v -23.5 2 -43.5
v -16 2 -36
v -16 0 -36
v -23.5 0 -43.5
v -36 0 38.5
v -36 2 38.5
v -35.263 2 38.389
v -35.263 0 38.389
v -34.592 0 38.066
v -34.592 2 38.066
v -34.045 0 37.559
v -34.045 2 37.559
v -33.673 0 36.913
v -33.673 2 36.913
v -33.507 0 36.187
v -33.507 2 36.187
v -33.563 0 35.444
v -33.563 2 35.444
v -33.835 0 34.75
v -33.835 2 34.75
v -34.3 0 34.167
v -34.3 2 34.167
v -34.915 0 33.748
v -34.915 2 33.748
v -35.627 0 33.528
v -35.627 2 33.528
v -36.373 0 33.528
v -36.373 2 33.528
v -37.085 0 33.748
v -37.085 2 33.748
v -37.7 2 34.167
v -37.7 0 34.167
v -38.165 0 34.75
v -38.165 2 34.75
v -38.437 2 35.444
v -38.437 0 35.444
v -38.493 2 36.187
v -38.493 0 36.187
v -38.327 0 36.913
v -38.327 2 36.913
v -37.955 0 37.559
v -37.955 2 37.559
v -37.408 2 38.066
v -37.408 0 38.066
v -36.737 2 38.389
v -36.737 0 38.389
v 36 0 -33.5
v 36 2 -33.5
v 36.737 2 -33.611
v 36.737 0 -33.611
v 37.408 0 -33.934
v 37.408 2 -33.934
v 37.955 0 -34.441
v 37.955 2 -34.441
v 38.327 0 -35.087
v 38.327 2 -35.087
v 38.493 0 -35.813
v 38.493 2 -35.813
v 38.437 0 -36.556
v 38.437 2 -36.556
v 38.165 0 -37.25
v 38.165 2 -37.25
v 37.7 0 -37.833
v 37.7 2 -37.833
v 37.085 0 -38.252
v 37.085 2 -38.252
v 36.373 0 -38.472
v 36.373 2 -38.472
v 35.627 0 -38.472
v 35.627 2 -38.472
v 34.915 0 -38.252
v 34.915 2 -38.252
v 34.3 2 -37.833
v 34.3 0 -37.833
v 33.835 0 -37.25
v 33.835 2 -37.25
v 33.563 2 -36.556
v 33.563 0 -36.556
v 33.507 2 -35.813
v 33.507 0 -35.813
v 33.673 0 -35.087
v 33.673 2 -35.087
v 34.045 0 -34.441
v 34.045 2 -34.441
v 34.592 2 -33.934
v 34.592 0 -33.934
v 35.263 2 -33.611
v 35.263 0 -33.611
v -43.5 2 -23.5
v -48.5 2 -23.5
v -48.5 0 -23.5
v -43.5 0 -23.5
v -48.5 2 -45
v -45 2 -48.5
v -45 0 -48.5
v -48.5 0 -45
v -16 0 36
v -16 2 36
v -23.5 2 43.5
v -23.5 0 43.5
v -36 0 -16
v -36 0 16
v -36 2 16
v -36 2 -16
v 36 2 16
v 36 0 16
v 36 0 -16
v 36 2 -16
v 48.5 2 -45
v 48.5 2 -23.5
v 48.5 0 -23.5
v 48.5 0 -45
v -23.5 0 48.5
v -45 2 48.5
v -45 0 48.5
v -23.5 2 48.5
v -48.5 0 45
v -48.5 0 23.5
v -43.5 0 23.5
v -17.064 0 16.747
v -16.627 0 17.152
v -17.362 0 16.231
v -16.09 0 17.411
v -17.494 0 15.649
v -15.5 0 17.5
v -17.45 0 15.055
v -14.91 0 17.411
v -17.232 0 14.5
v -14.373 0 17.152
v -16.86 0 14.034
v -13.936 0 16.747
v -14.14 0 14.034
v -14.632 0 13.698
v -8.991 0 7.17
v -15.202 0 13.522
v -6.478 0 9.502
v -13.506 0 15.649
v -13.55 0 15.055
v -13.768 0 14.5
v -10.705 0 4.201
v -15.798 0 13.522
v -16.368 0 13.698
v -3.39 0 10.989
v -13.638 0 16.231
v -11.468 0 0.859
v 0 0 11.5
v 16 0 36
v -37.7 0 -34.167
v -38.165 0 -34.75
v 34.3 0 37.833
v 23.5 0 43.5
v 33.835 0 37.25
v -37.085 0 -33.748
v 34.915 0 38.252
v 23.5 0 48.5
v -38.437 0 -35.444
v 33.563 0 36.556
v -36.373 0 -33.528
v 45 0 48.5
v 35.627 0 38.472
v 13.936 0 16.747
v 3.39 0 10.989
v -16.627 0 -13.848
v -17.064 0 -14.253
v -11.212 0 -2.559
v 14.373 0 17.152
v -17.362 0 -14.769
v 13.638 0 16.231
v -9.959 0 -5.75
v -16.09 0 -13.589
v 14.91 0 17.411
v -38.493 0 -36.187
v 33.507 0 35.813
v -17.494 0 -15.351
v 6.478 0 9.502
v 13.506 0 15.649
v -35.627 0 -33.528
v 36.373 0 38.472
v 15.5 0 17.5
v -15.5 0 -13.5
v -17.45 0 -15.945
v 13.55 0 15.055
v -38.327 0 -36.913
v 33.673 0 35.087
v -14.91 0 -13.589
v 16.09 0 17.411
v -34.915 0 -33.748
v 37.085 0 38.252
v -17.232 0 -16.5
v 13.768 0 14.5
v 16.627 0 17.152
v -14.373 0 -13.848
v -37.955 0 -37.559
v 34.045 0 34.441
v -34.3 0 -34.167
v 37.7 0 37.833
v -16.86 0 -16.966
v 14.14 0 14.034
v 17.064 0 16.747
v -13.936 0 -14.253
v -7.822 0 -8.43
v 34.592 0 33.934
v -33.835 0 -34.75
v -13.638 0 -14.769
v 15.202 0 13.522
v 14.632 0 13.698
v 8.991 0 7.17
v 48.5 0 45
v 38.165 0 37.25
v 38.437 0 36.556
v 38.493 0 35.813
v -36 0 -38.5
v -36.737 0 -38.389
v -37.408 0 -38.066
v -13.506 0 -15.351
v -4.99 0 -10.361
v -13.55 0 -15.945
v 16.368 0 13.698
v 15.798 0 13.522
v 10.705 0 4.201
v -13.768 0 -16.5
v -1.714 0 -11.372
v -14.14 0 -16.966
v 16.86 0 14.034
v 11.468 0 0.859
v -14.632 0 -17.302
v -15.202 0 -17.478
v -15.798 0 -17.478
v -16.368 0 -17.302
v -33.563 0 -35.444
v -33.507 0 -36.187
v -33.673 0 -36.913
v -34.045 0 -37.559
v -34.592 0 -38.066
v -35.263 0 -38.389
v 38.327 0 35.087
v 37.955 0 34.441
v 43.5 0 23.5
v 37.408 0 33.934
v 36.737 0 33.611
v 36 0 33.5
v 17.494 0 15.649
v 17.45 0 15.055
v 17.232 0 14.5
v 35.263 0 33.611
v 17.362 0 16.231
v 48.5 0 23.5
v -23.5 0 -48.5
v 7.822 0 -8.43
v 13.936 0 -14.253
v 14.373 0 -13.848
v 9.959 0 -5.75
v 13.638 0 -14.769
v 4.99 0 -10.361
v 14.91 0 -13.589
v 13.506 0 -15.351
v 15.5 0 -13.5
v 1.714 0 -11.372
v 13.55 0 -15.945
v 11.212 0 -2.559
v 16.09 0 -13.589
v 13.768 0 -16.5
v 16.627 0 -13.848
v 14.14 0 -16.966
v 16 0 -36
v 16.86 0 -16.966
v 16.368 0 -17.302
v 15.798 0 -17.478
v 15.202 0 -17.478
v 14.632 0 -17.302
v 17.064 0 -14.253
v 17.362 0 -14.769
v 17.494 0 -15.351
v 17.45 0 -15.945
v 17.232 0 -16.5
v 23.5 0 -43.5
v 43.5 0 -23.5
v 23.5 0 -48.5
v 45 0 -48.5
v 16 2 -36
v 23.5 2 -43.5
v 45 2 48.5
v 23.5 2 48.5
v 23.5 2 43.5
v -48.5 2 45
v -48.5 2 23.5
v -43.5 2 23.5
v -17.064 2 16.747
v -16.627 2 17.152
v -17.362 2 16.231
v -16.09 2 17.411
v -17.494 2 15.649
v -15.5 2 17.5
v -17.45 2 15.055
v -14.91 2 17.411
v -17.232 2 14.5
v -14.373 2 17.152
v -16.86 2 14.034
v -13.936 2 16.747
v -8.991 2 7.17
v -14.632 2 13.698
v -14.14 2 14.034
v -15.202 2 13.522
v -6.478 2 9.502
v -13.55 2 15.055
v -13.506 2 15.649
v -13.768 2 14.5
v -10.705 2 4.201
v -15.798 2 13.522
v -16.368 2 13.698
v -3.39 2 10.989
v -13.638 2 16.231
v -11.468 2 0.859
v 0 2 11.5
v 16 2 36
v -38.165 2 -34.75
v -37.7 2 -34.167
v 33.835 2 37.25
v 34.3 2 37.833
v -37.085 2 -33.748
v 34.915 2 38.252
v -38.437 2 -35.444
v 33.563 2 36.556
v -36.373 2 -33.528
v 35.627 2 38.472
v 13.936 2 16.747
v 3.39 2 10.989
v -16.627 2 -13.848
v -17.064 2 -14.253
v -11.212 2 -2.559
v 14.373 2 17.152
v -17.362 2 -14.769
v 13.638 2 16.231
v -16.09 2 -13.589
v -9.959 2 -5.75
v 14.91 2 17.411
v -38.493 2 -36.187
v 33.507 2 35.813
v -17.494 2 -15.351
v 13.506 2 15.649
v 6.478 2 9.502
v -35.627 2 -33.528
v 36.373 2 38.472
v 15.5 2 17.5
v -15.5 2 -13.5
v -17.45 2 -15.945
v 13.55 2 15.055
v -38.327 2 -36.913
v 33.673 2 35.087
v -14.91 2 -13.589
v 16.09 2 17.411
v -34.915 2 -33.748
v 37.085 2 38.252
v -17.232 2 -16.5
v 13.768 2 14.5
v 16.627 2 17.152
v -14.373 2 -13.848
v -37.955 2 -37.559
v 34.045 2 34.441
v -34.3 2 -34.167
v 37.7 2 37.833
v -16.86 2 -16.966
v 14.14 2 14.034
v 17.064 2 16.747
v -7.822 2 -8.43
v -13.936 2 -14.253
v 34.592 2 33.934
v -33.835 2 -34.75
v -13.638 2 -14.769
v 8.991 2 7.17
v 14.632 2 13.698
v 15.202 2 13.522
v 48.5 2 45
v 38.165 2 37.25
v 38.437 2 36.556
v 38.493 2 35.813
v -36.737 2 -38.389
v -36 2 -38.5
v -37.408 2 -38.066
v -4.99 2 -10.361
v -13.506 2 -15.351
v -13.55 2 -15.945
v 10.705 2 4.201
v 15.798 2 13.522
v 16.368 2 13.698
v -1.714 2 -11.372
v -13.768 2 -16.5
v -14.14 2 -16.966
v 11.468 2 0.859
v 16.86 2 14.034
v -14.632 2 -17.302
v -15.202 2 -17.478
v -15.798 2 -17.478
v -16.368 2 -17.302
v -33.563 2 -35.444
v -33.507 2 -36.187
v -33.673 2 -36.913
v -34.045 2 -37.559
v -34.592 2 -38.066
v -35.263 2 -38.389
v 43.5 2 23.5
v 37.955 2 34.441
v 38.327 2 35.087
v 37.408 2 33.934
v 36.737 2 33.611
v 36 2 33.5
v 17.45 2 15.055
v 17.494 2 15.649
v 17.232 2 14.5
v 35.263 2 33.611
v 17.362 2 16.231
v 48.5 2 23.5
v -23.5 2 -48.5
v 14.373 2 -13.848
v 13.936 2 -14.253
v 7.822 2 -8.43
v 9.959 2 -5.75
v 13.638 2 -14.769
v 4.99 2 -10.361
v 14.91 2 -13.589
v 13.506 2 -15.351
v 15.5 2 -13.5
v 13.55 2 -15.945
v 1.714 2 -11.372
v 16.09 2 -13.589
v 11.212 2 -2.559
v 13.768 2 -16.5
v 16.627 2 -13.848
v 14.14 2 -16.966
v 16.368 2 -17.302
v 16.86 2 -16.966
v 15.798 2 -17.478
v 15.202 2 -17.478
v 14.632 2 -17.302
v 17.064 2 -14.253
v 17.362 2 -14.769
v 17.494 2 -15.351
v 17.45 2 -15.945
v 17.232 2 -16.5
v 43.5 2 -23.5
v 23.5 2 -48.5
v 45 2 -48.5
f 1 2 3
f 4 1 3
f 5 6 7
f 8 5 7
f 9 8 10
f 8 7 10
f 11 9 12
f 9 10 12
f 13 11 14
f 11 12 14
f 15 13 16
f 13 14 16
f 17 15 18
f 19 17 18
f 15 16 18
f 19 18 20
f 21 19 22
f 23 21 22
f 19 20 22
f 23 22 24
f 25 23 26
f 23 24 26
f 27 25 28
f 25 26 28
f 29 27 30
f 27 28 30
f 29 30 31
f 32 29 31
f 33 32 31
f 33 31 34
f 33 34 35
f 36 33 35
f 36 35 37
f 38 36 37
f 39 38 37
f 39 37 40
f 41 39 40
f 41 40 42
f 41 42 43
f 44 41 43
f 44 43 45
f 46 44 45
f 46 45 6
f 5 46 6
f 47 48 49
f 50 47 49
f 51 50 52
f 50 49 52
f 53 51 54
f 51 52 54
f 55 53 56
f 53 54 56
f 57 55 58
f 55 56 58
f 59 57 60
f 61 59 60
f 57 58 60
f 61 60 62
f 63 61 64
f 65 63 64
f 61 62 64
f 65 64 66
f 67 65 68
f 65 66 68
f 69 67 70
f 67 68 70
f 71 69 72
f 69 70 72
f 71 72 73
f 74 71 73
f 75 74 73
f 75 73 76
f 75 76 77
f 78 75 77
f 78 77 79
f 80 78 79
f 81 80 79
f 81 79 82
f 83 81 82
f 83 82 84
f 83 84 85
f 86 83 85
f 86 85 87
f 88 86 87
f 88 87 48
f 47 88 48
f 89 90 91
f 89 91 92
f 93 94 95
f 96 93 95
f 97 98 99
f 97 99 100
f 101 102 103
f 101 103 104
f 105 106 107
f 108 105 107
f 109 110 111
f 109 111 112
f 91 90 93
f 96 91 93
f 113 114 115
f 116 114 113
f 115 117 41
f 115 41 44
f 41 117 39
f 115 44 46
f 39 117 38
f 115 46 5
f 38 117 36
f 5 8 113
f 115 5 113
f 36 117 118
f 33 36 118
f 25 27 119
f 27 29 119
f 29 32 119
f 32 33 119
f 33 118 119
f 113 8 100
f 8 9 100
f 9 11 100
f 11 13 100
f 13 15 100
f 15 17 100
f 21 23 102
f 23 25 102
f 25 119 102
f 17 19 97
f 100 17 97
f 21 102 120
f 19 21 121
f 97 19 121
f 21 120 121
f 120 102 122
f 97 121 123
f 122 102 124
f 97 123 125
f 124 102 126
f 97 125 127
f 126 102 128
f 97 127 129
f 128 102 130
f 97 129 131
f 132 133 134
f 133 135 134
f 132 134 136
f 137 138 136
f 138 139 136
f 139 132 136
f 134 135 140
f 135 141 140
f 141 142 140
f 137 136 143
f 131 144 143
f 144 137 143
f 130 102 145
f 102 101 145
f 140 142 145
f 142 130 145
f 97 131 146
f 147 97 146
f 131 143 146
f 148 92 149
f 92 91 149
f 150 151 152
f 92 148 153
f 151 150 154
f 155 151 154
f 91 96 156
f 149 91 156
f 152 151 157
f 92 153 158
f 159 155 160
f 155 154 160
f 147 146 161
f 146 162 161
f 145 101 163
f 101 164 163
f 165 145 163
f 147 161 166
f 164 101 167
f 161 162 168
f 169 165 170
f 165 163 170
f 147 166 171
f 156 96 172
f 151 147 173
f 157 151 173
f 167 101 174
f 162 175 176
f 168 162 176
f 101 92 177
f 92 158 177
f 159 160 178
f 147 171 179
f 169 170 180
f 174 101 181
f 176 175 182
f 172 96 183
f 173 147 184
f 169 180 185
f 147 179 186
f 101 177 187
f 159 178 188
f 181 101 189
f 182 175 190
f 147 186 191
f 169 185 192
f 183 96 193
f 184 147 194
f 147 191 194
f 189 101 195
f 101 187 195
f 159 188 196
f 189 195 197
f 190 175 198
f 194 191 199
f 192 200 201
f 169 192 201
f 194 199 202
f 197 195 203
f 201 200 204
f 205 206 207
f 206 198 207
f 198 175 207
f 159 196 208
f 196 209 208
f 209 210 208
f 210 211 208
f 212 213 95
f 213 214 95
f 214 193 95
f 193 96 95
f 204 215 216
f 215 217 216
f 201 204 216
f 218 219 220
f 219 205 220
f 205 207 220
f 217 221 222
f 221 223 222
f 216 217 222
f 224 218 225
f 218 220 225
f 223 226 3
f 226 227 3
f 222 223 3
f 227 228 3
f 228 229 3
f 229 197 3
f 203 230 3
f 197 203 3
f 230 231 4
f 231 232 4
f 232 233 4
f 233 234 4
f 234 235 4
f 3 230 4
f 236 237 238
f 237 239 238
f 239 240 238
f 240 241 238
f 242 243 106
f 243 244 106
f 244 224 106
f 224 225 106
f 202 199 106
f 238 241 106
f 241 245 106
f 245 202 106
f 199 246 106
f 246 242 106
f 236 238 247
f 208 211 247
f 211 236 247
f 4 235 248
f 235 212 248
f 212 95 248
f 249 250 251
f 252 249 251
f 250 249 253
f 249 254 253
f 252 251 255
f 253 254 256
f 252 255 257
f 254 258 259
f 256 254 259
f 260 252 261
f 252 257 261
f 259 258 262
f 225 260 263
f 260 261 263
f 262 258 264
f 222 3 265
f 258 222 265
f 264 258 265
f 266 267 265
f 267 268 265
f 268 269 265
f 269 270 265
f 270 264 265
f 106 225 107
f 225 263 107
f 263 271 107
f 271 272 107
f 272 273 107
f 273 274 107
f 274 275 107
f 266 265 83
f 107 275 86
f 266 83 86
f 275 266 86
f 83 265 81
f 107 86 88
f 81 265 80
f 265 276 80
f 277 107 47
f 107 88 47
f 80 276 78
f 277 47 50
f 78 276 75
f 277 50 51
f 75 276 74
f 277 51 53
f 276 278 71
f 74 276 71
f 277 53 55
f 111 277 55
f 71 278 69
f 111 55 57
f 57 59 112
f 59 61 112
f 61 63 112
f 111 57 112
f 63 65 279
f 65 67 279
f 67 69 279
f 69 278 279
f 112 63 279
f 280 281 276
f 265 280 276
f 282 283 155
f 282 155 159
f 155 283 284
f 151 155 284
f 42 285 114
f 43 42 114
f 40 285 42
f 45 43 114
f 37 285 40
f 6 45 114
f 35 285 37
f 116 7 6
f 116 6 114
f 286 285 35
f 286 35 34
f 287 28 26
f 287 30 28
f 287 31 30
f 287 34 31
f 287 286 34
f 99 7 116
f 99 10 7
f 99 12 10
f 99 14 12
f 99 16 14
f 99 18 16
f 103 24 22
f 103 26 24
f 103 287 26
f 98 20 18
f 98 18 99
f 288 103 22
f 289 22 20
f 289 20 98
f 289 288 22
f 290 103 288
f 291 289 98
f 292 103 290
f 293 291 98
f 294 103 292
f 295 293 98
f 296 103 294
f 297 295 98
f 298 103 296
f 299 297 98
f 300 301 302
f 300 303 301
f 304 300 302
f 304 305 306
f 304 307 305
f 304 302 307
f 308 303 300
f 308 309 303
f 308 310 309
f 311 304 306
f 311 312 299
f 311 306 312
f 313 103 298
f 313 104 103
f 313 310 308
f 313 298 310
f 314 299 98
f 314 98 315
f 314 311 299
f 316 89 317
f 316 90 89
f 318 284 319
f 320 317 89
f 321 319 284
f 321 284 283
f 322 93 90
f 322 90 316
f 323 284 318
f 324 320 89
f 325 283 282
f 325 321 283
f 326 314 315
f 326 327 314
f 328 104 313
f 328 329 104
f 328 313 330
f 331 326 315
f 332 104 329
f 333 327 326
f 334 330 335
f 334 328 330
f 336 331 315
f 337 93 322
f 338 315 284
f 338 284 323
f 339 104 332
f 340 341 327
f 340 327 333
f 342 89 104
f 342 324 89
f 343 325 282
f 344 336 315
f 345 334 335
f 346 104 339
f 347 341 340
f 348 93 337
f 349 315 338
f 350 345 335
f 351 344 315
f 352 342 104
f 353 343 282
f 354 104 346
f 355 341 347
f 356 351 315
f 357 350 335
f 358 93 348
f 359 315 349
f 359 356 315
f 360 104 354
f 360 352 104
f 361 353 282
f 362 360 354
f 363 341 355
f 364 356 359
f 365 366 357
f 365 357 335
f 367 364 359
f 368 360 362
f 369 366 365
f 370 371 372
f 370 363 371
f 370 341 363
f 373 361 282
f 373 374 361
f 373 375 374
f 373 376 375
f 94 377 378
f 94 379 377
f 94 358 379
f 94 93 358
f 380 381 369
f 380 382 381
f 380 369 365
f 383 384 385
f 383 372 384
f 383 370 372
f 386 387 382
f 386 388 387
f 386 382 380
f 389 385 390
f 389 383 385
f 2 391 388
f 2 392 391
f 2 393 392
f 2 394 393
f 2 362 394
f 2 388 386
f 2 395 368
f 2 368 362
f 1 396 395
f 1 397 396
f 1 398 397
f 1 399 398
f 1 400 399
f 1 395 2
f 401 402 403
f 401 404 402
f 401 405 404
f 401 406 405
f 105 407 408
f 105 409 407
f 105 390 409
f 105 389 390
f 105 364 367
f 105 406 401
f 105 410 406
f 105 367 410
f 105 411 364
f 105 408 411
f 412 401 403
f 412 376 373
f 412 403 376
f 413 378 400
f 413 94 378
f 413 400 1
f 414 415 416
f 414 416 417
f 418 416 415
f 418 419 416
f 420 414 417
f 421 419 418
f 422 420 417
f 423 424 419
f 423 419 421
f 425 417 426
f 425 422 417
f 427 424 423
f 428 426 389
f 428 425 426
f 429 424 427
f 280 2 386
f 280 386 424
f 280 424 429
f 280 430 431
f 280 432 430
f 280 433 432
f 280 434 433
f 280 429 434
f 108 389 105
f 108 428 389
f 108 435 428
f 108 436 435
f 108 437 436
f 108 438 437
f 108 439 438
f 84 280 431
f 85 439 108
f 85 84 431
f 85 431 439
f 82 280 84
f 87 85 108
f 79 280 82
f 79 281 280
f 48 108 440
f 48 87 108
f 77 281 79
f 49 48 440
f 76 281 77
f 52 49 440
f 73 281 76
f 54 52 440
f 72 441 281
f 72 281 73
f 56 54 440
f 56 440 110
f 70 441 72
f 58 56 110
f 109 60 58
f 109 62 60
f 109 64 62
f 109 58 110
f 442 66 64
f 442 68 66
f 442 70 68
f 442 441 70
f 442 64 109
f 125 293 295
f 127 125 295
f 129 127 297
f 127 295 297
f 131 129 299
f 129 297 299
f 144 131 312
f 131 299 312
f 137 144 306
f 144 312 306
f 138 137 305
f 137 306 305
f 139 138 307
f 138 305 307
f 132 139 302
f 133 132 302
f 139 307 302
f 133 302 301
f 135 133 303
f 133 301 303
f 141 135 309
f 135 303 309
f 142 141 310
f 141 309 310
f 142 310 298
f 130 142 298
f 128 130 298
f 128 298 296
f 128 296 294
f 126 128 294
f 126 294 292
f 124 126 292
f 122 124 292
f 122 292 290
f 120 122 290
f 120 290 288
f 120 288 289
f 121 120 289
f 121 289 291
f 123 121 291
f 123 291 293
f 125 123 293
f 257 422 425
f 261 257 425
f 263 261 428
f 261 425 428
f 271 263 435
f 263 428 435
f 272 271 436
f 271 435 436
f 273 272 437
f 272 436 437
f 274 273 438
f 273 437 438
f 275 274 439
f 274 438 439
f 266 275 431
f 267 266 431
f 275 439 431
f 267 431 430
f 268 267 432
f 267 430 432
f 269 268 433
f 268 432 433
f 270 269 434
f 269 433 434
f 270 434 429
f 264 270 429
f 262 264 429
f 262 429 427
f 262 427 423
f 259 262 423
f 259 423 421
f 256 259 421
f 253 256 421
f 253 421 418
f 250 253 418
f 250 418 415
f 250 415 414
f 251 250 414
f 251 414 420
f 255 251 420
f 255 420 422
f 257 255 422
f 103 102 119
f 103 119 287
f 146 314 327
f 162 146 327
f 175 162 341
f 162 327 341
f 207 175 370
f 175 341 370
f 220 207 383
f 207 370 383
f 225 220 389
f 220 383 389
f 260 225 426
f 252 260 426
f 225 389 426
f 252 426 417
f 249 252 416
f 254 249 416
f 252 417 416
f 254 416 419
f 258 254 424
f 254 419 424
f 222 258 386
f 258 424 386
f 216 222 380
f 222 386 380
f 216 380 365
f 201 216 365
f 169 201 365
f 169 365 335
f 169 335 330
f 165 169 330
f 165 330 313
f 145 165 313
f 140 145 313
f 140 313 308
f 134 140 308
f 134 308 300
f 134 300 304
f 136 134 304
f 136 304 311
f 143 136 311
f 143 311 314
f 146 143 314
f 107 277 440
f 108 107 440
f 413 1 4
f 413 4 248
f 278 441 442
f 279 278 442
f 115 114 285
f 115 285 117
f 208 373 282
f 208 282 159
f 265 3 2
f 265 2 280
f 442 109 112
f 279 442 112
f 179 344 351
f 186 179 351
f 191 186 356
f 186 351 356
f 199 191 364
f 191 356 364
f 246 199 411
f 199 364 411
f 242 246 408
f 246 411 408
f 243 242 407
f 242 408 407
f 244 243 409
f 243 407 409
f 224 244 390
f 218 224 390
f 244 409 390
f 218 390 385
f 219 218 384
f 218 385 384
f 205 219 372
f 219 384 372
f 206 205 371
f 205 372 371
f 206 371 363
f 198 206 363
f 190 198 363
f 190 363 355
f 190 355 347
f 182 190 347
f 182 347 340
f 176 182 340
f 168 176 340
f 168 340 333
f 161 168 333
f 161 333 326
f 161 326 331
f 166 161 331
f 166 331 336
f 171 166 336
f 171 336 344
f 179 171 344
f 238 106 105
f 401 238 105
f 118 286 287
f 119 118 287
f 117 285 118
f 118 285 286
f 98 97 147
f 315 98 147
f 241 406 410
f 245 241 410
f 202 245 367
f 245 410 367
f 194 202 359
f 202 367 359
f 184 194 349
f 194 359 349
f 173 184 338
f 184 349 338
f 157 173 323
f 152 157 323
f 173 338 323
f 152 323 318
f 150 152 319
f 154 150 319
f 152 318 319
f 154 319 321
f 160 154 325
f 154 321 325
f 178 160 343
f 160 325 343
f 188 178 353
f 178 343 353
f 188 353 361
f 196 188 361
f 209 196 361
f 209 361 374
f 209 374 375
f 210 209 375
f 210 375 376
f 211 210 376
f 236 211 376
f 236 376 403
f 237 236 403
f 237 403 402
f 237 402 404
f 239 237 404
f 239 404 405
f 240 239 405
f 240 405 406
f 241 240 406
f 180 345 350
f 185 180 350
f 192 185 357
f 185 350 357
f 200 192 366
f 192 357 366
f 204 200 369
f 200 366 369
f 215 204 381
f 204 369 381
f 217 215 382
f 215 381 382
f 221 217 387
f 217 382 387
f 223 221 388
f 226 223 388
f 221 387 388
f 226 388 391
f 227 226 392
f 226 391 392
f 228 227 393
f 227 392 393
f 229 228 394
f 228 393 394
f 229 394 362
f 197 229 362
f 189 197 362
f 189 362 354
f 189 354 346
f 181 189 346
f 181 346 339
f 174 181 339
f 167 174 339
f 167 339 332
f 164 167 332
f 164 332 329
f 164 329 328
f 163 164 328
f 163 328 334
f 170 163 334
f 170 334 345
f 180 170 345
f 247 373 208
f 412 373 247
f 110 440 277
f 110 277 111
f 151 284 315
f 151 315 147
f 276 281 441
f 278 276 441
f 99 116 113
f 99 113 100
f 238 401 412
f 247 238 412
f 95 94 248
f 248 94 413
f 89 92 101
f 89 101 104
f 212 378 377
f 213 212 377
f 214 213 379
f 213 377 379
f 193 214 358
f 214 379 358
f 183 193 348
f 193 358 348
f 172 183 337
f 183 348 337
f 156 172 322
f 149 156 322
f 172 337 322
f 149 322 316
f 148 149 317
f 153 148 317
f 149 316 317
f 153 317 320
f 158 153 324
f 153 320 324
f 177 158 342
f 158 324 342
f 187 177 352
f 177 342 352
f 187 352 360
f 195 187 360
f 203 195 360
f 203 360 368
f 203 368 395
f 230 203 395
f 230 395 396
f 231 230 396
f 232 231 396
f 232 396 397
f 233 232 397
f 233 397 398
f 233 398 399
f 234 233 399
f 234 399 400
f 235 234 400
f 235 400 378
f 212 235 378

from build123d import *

# Parameters (mm, degrees)
SKETCH1_W           = 72
SKETCH1_H           = 72
BOSS_EXTRUDE1_DEPTH = 2
SKETCH5_W           = 25
SKETCH5_H           = 25
BOSS_EXTRUDE2_DEPTH = 2
SKETCH3_R           = 2
SKETCH3_R_2         = 11.5
SKETCH3_R_3         = 2.5
CUT_EXTRUDE1_DEPTH  = 69.618510622
CHAMFER1_SIZE       = 7.5
CHAMFER2_SIZE       = 3.5


with BuildPart() as part:
    # Sketch1 → Boss-Extrude1 (new body)
    with BuildSketch(Plane(origin=(0, 0, 0), x_dir=(1, 0, 0), z_dir=(0, 1, 0))):
        Rectangle(SKETCH1_W, SKETCH1_H)
    extrude(amount=BOSS_EXTRUDE1_DEPTH)

    # Sketch5 → Boss-Extrude2 (add)
    with BuildSketch(Plane(origin=(0, 2, 0), x_dir=(1, 0, 0), z_dir=(0, 1, 0))):
        with Locations((-36, -36)):
            Rectangle(SKETCH5_W, SKETCH5_H)
        with Locations((36, -36)):
            Rectangle(SKETCH5_W, SKETCH5_H)
        with Locations((36, 36)):
            Rectangle(SKETCH5_W, SKETCH5_H)
        with Locations((-36, 36)):
            Rectangle(SKETCH5_W, SKETCH5_H)
    extrude(amount=-BOSS_EXTRUDE2_DEPTH)

    # Sketch3 → Cut-Extrude1 (cut, through all)
    with BuildSketch(Plane(origin=(0, 2, 0), x_dir=(1, 0, 0), z_dir=(0, 1, 0))):
        with Locations(Location((-15.5, 15.5, 0), (0, 0, 270))):
            Circle(SKETCH3_R)
        with Locations(Location((15.5, 15.5, 0), (0, 0, 270))):
            Circle(SKETCH3_R)
        with Locations(Location((15.5, -15.5, 0), (0, 0, 270))):
            Circle(SKETCH3_R)
        with Locations(Location((-15.5, -15.5, 0), (0, 0, 270))):
            Circle(SKETCH3_R)
        with Locations(Location((0, 0, 0), (0, 0, 270))):
            Circle(SKETCH3_R_2)
        with Locations(Location((-36, -36, 0), (0, 0, 270))):
            Circle(SKETCH3_R_3)
        with Locations(Location((36, -36, 0), (0, 0, 90))):
            Circle(SKETCH3_R_3)
        with Locations(Location((36, 36, 0), (0, 0, 270))):
            Circle(SKETCH3_R_3)
        with Locations(Location((-36, 36, 0), (0, 0, 90))):
            Circle(SKETCH3_R_3)
    extrude(amount=-CUT_EXTRUDE1_DEPTH, mode=Mode.SUBTRACT)

    # Chamfer1
    chamfer1_edges = [part.edges().sort_by_distance(p)[0] for p in [
        (-23.5, 1, 36),
        (-36, 1, 23.5),
        (36, 1, 23.5),
        (23.5, 1, 36),
        (36, 1, -23.5),
        (23.5, 1, -36),
        (-36, 1, -23.5),
        (-23.5, 1, -36),
    ]]
    chamfer(chamfer1_edges, length=CHAMFER1_SIZE)

    # Chamfer2
    chamfer2_edges = [part.edges().sort_by_distance(p)[0] for p in [
        (-48.5, 1, 48.5),
        (48.5, 1, 48.5),
        (48.5, 1, -48.5),
        (-48.5, 1, -48.5),
    ]]
    chamfer(chamfer2_edges, length=CHAMFER2_SIZE)


solid = part.part
